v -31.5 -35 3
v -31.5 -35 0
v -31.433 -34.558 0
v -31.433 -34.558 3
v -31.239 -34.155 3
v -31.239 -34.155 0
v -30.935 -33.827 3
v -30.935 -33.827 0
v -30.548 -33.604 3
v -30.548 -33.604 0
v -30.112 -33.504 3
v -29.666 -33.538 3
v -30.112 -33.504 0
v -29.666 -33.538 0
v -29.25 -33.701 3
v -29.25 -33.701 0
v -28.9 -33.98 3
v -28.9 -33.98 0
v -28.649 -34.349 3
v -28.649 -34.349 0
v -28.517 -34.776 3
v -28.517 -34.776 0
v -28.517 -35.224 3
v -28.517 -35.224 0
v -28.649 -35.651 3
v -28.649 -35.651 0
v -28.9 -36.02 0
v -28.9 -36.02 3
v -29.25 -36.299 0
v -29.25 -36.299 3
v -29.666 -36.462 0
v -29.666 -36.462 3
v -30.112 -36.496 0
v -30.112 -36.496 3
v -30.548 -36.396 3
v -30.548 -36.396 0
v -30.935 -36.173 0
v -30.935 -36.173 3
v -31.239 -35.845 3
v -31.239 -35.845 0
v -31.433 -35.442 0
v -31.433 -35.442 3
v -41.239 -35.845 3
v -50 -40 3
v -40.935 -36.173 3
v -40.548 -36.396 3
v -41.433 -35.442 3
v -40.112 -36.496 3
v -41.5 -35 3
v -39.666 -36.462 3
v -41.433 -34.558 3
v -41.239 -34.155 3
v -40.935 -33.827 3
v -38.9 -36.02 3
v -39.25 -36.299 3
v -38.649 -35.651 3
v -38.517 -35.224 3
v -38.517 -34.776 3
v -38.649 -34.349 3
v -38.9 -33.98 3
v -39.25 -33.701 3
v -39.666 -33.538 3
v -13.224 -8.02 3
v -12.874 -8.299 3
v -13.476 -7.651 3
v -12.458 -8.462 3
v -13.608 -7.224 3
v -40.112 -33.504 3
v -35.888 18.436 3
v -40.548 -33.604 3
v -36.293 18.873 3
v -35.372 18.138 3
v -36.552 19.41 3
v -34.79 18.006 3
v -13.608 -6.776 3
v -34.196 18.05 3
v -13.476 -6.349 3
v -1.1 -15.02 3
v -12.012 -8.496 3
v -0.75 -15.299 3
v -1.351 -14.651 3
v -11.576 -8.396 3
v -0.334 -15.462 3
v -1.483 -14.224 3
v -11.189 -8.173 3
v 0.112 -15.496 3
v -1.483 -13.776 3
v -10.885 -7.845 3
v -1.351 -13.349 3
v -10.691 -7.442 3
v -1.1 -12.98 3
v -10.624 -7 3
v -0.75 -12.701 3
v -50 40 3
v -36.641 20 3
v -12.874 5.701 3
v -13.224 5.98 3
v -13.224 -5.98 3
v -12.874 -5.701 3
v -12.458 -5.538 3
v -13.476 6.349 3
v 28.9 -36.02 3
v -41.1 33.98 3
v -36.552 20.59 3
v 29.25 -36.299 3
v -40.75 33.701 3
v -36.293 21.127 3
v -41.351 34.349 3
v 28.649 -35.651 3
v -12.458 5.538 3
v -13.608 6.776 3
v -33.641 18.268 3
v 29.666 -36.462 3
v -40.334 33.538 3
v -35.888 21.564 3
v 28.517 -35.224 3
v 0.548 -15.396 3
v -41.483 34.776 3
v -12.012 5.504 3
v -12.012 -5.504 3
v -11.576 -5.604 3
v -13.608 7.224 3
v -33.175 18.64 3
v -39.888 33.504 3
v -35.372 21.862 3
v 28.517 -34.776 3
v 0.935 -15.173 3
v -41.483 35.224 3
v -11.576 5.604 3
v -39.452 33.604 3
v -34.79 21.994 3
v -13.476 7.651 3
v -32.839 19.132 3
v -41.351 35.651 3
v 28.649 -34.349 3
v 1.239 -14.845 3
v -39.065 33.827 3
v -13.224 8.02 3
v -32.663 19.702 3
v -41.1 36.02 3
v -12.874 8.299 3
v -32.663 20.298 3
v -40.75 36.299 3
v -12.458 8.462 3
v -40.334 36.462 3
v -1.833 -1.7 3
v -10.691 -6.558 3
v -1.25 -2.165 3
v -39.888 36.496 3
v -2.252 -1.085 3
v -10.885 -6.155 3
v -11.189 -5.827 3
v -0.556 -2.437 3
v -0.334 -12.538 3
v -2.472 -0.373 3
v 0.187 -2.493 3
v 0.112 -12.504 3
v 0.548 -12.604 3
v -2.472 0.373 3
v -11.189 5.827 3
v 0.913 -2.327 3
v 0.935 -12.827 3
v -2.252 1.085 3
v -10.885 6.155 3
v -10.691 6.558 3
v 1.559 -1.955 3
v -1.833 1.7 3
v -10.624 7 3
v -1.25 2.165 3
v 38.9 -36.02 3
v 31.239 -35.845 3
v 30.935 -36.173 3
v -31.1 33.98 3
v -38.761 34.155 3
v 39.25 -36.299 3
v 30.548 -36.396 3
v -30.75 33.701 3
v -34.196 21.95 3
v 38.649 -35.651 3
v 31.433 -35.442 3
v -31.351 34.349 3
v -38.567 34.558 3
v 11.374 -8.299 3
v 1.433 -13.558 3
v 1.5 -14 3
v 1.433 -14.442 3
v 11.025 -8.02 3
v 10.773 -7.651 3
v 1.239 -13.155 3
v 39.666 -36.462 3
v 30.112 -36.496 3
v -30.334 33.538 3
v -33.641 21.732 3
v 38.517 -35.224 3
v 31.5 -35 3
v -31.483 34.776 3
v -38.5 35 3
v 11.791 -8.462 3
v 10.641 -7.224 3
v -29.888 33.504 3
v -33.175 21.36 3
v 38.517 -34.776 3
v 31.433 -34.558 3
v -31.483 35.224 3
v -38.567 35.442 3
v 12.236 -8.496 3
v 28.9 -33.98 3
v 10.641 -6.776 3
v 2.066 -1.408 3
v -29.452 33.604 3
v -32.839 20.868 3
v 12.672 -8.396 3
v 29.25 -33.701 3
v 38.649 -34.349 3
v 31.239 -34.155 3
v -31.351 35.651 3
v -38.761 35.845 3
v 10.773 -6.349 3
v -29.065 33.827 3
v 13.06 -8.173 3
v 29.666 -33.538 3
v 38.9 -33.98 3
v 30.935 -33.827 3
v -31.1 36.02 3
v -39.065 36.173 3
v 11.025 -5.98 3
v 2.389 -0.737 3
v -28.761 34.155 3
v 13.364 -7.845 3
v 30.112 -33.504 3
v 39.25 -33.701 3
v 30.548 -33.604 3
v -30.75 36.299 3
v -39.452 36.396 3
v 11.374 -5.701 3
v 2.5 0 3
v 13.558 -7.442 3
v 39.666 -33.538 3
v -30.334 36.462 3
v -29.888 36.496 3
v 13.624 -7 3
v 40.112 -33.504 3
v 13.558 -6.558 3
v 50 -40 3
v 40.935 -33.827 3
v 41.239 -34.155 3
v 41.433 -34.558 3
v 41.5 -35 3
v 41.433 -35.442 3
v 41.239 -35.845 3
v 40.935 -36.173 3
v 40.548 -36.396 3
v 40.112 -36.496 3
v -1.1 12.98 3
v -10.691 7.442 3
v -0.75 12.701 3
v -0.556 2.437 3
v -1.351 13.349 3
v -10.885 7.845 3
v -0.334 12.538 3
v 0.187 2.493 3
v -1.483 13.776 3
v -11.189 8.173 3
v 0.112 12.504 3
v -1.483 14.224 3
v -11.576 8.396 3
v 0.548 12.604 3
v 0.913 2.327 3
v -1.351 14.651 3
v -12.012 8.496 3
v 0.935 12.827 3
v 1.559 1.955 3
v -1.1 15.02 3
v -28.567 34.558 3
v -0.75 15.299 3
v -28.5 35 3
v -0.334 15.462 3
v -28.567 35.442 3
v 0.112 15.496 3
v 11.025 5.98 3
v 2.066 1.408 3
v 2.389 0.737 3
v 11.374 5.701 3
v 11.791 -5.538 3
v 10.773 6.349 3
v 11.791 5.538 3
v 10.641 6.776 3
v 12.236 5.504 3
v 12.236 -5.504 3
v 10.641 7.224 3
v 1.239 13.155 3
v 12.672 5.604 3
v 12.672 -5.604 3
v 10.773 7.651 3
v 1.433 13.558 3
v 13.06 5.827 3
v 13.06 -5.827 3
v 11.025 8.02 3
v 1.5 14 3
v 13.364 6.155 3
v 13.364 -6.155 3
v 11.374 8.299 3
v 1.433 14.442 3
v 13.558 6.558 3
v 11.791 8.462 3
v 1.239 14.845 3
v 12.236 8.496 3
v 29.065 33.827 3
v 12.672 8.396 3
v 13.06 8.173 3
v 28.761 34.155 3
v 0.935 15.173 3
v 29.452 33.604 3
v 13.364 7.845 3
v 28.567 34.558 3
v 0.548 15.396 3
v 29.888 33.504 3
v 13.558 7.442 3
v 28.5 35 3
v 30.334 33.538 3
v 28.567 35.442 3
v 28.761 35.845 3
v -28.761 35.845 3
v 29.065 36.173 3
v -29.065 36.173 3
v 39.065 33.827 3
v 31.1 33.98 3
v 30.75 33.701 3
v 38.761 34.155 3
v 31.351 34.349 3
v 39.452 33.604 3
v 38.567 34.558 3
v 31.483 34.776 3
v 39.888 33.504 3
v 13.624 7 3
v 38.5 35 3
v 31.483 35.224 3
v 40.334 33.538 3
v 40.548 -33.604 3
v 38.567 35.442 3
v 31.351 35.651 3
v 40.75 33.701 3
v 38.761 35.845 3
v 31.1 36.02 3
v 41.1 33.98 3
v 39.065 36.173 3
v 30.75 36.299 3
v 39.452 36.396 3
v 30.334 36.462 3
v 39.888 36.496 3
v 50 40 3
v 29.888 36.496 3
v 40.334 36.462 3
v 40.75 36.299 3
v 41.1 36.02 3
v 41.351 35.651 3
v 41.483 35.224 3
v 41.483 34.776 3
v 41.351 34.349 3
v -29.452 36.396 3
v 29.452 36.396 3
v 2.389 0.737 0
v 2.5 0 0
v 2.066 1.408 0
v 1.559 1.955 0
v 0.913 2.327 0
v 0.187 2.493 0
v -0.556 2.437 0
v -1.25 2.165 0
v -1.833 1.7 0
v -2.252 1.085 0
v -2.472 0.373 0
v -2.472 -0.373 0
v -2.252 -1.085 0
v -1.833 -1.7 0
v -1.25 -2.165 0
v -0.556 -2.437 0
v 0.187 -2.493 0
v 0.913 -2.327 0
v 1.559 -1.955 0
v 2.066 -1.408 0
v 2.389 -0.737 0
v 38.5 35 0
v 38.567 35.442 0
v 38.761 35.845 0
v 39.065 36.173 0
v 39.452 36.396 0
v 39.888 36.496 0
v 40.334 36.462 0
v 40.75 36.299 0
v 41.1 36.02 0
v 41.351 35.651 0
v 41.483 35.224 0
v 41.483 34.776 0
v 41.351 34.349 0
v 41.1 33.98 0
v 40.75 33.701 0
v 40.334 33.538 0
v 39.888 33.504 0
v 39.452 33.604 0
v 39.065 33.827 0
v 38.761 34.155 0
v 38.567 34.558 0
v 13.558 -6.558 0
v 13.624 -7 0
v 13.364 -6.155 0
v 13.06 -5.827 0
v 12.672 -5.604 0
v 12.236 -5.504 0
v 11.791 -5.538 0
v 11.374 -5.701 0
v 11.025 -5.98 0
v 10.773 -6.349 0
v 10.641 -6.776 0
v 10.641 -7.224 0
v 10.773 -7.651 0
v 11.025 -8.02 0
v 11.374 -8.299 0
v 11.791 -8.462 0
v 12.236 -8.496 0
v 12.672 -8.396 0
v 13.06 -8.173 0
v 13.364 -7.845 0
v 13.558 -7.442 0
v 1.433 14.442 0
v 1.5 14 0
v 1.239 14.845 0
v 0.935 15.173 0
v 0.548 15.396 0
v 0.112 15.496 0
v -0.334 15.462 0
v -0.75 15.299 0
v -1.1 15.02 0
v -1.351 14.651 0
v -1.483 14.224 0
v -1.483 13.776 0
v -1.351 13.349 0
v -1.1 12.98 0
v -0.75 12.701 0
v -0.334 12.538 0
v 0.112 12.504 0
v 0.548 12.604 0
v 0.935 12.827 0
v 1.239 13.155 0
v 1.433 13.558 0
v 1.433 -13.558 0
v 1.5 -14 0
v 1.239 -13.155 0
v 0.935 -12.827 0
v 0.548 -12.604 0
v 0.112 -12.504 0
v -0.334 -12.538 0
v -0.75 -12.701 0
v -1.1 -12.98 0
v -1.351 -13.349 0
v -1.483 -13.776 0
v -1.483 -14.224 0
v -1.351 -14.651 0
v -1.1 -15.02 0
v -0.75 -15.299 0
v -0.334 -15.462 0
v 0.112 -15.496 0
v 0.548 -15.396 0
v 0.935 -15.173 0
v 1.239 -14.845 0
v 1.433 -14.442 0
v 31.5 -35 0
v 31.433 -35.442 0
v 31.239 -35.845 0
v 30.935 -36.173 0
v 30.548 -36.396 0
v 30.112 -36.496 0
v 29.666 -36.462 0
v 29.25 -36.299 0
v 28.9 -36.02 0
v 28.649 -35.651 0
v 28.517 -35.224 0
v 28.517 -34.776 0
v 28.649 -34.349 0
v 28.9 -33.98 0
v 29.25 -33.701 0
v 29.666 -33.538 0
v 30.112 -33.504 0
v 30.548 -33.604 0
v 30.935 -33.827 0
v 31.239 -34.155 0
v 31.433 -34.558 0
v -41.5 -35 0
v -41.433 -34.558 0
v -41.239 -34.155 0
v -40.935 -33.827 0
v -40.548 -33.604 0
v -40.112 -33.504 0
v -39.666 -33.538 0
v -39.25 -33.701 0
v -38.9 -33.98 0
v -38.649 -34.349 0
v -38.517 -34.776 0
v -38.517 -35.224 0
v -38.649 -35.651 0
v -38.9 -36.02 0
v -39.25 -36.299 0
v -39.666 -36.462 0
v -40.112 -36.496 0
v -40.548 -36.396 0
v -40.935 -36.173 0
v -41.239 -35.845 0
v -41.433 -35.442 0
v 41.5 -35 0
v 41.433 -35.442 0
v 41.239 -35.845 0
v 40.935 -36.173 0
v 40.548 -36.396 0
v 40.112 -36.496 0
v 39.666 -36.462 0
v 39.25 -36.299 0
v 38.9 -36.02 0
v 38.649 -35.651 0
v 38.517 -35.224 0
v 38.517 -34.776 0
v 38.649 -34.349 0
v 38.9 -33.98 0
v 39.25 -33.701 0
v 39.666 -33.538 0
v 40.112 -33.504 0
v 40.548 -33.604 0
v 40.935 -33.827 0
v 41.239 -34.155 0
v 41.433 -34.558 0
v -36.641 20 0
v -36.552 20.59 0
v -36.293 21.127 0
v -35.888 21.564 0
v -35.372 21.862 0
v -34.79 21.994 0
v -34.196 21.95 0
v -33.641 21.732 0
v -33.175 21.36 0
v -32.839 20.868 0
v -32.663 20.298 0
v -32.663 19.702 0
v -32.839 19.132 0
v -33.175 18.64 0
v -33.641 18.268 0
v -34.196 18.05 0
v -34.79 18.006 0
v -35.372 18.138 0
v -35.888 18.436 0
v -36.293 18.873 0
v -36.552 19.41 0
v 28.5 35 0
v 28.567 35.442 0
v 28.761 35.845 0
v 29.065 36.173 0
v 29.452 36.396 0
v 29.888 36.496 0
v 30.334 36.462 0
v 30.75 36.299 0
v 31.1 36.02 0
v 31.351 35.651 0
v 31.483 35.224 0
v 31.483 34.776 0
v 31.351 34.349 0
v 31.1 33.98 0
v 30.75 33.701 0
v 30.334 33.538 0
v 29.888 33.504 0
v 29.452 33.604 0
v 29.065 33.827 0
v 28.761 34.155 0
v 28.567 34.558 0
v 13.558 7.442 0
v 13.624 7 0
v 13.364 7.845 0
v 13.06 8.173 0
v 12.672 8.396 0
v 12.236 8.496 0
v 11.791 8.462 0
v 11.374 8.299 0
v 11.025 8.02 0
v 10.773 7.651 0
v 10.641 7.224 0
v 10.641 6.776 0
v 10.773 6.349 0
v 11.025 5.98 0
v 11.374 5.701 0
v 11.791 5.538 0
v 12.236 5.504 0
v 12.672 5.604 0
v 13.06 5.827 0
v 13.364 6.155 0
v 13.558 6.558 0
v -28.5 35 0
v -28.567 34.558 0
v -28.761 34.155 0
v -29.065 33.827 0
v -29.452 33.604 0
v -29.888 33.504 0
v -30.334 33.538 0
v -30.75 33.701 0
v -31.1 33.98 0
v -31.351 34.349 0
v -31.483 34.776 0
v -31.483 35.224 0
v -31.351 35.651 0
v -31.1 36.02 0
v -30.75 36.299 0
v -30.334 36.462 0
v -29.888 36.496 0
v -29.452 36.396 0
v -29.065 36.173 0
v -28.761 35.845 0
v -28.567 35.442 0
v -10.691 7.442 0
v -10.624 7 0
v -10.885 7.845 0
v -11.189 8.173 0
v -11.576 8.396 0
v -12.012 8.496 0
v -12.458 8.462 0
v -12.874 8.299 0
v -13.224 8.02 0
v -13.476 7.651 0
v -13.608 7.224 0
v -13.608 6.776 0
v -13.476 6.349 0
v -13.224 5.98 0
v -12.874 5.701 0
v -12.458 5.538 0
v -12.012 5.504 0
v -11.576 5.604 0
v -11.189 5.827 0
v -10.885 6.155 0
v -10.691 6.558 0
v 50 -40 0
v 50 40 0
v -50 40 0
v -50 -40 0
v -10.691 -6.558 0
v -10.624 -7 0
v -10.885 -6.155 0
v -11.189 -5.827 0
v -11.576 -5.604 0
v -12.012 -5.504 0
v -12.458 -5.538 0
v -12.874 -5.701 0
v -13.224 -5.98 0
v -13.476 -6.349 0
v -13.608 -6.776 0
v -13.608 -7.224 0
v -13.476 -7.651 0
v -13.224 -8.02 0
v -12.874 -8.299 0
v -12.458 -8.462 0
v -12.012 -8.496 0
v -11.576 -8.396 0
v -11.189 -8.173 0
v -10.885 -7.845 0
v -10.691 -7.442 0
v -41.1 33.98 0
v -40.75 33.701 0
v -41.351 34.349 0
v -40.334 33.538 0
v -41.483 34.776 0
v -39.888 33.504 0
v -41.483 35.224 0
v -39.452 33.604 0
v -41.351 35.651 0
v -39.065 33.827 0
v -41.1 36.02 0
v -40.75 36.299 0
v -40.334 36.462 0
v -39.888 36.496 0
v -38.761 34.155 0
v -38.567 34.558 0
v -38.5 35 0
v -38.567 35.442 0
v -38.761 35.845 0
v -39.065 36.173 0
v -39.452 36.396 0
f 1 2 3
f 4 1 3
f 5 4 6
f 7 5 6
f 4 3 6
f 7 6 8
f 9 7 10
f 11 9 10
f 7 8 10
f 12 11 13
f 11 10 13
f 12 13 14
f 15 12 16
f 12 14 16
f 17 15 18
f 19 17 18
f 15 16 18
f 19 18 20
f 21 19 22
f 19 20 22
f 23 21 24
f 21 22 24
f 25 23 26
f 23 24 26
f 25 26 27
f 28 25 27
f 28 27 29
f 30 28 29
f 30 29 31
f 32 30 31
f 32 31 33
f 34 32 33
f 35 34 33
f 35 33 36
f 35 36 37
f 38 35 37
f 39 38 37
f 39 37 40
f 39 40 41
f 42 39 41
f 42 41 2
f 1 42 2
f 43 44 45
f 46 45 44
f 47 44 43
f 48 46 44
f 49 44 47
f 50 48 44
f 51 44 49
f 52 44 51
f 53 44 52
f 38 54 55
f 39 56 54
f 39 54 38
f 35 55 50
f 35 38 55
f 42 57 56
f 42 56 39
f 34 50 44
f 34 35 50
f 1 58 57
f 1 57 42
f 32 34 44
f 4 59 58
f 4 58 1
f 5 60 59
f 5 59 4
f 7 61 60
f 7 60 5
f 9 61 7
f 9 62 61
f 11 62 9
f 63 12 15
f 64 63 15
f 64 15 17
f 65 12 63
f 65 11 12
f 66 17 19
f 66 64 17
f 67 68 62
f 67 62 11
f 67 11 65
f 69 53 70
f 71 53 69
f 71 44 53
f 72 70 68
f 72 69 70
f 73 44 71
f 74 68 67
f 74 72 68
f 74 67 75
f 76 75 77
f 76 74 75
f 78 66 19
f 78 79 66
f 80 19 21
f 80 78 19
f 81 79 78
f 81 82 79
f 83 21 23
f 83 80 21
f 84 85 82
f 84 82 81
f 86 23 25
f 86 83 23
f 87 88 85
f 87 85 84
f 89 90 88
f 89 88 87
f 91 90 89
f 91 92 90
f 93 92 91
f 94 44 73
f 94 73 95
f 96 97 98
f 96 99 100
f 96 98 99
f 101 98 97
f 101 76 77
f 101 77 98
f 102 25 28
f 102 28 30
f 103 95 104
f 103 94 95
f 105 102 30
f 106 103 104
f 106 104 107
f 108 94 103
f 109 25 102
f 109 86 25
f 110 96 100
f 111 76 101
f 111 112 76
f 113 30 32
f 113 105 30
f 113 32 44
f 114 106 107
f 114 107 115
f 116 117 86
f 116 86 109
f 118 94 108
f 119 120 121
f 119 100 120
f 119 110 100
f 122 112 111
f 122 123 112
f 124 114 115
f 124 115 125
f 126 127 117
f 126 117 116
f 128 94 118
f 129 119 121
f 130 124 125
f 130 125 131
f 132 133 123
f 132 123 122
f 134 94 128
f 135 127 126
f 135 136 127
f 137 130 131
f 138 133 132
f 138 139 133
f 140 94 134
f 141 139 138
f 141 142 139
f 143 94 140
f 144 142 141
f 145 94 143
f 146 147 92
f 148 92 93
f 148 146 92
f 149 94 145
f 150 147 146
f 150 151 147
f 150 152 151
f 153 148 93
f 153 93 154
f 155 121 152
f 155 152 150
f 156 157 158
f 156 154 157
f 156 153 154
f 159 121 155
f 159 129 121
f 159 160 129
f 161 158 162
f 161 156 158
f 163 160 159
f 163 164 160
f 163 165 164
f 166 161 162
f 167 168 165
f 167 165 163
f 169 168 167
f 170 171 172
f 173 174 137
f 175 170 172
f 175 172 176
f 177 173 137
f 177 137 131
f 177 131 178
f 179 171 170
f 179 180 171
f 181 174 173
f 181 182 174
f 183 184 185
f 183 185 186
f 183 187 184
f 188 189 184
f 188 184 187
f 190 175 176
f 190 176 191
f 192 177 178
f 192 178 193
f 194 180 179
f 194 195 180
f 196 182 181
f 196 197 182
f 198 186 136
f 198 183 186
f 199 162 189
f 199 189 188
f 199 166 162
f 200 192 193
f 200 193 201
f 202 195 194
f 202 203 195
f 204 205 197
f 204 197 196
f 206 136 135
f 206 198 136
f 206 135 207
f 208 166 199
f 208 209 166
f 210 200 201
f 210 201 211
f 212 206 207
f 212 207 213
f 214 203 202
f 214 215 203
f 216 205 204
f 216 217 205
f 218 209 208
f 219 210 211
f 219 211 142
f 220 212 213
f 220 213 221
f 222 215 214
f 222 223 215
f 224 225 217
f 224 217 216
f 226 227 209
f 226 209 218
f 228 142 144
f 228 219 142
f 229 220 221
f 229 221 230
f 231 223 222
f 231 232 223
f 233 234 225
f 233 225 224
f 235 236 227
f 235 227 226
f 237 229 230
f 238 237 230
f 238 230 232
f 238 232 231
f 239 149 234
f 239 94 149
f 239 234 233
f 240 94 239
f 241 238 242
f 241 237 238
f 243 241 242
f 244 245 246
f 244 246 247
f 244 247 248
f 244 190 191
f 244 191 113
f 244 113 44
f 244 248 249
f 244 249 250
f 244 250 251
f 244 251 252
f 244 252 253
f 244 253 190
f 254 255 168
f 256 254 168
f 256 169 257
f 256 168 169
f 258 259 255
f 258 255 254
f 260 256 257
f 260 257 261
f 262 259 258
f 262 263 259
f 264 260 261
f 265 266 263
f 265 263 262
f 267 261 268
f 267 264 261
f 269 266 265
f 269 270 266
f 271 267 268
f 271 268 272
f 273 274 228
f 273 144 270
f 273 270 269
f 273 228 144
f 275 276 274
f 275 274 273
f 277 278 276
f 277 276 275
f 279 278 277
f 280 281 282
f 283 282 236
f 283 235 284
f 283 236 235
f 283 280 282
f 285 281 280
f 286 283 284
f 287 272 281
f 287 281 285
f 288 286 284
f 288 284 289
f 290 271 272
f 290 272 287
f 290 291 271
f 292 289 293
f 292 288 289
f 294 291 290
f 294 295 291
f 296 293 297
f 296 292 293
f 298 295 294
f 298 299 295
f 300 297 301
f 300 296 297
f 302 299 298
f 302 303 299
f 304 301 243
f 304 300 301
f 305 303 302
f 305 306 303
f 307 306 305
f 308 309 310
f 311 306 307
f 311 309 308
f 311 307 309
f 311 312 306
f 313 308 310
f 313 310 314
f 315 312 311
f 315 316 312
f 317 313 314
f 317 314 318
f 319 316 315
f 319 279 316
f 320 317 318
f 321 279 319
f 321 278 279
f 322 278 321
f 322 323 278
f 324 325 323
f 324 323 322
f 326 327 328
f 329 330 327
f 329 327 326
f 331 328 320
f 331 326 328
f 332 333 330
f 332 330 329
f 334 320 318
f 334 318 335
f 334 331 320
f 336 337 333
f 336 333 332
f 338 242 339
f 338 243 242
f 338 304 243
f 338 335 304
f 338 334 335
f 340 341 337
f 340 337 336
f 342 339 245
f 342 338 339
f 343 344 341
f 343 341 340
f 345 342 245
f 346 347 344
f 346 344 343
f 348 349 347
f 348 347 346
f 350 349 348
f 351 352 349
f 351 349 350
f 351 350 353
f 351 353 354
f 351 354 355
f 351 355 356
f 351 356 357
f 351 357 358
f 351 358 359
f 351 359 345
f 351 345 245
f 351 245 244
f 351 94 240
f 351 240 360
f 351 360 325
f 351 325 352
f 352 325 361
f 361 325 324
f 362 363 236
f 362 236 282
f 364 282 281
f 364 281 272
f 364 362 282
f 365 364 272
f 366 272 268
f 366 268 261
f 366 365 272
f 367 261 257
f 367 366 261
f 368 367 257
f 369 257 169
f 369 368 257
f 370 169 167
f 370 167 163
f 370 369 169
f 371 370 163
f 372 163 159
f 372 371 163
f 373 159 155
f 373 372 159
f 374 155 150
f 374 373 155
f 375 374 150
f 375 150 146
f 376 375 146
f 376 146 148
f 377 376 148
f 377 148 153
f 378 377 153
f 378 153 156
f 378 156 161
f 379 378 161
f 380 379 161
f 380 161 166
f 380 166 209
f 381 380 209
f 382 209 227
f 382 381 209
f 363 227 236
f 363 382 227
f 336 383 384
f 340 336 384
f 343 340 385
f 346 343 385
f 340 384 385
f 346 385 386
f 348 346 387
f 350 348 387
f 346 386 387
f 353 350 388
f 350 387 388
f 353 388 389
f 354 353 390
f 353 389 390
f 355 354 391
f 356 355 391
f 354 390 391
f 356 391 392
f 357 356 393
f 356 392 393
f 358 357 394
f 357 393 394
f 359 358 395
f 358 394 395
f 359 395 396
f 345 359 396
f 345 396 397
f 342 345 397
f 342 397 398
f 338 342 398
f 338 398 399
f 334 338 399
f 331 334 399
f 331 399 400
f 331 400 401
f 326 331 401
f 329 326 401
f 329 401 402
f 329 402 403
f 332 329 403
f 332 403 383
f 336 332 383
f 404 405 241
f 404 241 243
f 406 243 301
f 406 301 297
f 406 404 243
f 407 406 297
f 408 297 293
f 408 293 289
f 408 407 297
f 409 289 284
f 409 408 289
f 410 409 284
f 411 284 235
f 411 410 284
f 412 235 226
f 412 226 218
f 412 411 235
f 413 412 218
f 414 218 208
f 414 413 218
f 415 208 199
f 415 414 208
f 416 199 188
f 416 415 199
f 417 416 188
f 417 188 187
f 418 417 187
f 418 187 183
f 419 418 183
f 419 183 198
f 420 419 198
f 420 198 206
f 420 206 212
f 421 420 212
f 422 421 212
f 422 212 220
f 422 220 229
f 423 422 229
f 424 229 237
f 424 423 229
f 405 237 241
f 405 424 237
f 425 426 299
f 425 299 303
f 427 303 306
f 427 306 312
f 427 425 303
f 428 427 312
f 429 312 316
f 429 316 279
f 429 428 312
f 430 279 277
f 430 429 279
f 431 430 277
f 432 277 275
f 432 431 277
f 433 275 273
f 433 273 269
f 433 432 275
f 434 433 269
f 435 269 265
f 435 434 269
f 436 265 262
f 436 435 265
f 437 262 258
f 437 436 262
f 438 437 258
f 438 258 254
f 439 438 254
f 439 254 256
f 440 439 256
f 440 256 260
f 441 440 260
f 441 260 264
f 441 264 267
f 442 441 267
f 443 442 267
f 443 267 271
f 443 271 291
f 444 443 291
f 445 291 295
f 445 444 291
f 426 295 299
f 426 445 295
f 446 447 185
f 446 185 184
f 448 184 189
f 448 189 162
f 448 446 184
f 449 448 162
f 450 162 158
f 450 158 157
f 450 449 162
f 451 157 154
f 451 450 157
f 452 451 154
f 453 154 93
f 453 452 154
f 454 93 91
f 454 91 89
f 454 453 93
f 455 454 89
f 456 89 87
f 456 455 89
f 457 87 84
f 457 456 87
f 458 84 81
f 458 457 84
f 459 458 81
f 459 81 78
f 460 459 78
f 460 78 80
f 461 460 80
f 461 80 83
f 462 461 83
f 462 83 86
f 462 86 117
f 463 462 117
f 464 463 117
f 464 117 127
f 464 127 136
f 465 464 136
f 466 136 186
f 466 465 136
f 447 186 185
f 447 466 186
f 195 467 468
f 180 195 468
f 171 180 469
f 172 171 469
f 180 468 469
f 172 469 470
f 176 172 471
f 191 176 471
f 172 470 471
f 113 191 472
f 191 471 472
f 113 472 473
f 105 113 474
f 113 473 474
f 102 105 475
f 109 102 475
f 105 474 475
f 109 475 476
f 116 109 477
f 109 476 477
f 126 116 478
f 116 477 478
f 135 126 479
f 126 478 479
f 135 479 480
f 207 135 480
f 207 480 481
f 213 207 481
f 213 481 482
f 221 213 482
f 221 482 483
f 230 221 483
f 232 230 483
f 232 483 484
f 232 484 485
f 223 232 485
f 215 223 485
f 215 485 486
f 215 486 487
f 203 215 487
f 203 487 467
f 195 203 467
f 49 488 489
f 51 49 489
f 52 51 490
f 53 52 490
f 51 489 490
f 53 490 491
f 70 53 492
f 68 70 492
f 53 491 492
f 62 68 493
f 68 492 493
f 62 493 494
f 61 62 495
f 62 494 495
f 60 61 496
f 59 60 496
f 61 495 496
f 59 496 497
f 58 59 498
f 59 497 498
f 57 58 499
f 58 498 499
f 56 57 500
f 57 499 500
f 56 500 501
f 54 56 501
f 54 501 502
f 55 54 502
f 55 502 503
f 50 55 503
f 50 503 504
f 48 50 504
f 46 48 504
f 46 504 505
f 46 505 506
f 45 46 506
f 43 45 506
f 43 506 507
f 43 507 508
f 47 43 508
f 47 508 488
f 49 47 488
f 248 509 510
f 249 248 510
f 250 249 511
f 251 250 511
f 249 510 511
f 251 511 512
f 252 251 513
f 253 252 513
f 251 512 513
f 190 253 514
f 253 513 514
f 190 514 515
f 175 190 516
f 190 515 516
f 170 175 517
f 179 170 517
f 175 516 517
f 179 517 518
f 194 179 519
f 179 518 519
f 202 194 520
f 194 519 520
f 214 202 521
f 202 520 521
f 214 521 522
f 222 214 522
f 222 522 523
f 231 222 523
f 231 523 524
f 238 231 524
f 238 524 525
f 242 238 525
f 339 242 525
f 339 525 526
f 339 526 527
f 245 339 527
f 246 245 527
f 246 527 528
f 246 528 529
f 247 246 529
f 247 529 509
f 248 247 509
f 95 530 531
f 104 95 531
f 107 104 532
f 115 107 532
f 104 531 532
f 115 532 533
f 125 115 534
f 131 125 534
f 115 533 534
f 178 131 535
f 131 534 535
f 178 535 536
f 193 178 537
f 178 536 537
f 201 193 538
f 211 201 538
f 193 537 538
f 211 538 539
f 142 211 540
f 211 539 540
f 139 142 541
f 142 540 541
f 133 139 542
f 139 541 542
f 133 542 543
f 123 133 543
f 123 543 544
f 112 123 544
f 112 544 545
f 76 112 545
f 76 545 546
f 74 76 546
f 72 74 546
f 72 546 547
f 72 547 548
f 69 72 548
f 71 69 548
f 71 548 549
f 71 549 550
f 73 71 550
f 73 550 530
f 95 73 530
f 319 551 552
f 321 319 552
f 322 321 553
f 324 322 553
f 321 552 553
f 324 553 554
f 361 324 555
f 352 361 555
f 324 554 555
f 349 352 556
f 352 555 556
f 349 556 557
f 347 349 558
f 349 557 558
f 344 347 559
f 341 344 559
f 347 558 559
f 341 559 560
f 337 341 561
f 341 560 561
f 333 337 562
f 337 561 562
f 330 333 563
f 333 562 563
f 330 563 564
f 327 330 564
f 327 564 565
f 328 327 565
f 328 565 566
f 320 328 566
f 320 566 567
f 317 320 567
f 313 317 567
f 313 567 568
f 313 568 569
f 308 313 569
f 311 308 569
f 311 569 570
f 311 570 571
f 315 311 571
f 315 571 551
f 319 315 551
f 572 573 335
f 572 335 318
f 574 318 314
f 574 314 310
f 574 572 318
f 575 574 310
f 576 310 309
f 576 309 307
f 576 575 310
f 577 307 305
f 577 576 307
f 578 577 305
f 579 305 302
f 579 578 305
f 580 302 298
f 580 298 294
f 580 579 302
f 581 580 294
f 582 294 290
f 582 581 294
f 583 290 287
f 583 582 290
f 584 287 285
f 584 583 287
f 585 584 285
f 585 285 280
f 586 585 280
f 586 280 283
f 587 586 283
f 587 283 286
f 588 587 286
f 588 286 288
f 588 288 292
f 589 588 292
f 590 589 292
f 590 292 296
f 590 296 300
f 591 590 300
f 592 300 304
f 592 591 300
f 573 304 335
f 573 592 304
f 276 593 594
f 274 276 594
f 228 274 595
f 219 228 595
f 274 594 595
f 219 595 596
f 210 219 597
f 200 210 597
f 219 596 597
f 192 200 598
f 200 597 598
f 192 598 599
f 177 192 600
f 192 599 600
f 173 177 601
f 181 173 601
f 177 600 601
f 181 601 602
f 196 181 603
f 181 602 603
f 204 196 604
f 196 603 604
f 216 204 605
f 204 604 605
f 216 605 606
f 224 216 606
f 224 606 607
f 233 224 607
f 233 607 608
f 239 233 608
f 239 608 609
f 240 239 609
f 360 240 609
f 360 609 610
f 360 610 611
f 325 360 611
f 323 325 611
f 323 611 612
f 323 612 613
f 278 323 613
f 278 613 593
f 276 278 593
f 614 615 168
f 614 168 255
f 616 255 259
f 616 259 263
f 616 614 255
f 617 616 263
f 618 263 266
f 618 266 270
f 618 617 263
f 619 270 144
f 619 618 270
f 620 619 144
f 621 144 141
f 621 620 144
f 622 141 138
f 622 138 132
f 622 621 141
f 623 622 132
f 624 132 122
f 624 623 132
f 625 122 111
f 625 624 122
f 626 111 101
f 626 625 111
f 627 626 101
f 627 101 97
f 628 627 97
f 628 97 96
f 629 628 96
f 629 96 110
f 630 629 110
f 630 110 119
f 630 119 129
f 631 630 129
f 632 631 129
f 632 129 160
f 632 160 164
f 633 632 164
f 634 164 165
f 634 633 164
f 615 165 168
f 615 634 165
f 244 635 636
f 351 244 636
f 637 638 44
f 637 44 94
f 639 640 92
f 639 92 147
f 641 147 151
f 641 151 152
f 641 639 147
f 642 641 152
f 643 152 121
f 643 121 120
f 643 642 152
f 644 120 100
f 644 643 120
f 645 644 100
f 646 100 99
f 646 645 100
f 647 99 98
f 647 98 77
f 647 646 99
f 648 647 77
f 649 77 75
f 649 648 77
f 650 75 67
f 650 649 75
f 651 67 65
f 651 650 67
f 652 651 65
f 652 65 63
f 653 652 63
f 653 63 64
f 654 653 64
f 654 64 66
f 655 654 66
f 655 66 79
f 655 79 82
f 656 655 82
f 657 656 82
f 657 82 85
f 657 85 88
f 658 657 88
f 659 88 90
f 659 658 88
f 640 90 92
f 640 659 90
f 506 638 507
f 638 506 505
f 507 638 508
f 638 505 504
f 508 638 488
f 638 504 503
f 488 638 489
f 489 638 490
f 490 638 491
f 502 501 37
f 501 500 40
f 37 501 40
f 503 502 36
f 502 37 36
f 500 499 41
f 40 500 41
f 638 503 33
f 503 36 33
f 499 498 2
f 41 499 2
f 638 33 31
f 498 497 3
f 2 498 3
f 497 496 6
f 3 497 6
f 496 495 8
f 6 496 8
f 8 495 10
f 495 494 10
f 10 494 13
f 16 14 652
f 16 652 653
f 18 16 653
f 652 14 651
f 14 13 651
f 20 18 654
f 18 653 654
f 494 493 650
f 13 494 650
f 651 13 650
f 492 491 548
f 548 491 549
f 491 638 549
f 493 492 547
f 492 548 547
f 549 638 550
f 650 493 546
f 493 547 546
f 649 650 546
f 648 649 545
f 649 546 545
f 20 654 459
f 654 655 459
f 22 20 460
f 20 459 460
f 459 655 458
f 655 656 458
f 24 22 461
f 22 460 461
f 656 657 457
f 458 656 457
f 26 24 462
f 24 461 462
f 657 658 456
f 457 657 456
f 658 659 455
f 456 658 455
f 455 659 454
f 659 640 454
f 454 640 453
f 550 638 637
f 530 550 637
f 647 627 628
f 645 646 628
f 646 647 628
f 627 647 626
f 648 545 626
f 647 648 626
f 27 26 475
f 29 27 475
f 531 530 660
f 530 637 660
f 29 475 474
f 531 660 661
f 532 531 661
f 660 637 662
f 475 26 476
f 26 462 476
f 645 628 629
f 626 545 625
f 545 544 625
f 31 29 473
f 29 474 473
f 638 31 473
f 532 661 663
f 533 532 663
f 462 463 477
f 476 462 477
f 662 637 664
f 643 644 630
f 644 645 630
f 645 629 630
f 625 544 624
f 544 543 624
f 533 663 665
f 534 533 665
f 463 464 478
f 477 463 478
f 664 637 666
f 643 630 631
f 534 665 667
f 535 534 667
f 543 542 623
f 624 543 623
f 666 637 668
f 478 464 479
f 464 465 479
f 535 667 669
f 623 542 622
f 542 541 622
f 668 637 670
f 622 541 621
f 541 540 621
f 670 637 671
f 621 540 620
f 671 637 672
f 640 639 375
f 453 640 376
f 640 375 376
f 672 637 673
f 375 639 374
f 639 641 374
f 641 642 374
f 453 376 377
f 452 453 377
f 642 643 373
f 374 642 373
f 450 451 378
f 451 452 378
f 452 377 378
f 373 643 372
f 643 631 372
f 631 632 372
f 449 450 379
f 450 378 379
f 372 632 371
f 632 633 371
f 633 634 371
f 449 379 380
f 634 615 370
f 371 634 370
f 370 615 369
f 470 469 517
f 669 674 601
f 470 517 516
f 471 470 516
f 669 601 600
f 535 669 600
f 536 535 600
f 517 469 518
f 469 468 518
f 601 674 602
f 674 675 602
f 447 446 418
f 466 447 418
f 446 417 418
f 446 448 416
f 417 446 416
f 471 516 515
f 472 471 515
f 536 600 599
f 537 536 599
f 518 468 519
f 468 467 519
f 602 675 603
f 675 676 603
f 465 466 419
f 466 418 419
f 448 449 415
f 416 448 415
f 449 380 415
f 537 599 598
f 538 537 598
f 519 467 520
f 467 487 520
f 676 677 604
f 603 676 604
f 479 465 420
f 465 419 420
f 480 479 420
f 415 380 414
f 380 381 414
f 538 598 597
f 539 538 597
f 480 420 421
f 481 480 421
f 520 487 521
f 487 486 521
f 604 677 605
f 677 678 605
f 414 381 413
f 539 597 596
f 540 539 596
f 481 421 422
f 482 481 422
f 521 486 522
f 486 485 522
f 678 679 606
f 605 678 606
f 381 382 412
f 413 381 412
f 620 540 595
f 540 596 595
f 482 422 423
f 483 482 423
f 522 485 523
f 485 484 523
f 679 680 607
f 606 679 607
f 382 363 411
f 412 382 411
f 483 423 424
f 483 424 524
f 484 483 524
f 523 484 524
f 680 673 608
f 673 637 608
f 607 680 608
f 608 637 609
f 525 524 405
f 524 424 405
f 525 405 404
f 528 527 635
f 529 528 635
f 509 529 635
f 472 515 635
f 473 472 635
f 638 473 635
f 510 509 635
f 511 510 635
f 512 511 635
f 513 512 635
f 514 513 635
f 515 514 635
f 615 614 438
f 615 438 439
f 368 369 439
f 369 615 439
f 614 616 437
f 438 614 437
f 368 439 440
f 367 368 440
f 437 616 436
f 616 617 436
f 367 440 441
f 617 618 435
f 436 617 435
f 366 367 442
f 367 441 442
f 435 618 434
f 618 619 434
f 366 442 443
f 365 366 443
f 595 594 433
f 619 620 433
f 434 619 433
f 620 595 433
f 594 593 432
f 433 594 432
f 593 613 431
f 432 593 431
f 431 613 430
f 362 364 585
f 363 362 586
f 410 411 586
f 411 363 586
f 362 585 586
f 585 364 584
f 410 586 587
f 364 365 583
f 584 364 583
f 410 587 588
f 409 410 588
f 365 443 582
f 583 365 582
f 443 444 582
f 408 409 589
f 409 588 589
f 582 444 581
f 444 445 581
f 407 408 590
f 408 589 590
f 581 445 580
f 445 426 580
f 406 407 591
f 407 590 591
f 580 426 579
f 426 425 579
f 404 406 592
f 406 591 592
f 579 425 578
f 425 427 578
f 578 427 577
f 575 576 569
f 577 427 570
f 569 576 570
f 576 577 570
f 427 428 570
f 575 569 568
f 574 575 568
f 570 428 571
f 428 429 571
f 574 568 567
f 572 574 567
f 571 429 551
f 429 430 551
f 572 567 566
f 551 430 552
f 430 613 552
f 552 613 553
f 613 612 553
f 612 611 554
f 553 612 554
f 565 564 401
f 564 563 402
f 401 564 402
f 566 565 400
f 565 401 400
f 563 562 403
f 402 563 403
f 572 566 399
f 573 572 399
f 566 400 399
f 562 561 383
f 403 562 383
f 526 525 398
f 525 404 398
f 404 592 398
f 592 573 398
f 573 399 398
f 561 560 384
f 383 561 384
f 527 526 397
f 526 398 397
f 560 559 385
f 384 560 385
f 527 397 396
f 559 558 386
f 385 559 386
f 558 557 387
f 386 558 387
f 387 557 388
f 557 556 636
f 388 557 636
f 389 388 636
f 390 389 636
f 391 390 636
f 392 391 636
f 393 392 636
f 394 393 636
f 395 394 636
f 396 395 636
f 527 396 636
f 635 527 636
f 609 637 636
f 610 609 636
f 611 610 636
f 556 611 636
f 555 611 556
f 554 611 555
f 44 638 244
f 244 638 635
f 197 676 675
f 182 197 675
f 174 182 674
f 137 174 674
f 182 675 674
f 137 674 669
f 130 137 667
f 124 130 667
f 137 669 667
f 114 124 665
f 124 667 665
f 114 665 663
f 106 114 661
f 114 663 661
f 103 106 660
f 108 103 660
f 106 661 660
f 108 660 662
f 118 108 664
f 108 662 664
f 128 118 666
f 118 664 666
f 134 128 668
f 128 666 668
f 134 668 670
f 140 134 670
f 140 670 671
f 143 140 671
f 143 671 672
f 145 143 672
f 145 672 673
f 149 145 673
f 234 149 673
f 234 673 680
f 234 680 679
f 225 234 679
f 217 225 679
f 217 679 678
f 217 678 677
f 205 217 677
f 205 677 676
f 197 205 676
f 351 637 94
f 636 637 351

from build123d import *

# Parameters (mm, degrees)
SKETCH_1_W          = 100
SKETCH_1_H          = 80
SKETCH_1_R          = 1.5
SKETCH_1_R_2        = 2.5
EXTRUDE_1_DEPTH     = 3
SKETCH_2_R          = 1.5
CUT_EXTRUDE_1_DEPTH = 10
SKETCH_3_R          = 2
CUT_EXTRUDE_2_DEPTH = 65.101482042


with BuildPart() as part:
    # 草图1 → 凸台-拉伸1 (new body)
    with BuildSketch(Plane.XY):
        Rectangle(SKETCH_1_W, SKETCH_1_H)
        with Locations((0, 14)):
            Circle(SKETCH_1_R, mode=Mode.SUBTRACT)
        with Locations((12.124355653, 7)):
            Circle(SKETCH_1_R, mode=Mode.SUBTRACT)
        with Locations((12.124355653, -7)):
            Circle(SKETCH_1_R, mode=Mode.SUBTRACT)
        with Locations((0, -14)):
            Circle(SKETCH_1_R, mode=Mode.SUBTRACT)
        with Locations((-12.124355653, -7)):
            Circle(SKETCH_1_R, mode=Mode.SUBTRACT)
        with Locations((-12.124355653, 7)):
            Circle(SKETCH_1_R, mode=Mode.SUBTRACT)
        Circle(SKETCH_1_R_2, mode=Mode.SUBTRACT)
    extrude(amount=EXTRUDE_1_DEPTH)

    # 草图2 → 切除-拉伸1 (cut)
    with BuildSketch(Plane(origin=(0, 0, 0), x_dir=(-1, 0, 0), z_dir=(0, 0, -1))):
        with Locations((-40, 35)):
            Circle(SKETCH_2_R)
        with Locations((-30, 35)):
            Circle(SKETCH_2_R)
        with Locations(Location((30, 35, 0), (0, 0, 180))):
            Circle(SKETCH_2_R)
        with Locations(Location((40, 35, 0), (0, 0, 180))):
            Circle(SKETCH_2_R)
        with Locations((40, -35)):
            Circle(SKETCH_2_R)
        with Locations((30, -35)):
            Circle(SKETCH_2_R)
        with Locations(Location((-30, -35, 0), (0, 0, 180))):
            Circle(SKETCH_2_R)
        with Locations(Location((-40, -35, 0), (0, 0, 180))):
            Circle(SKETCH_2_R)
    extrude(amount=-CUT_EXTRUDE_1_DEPTH, mode=Mode.SUBTRACT)

    # 草图3 → 切除-拉伸2 (cut, through all)
    with BuildSketch(Plane(origin=(0, 0, 0), x_dir=(-1, 0, 0), z_dir=(0, 0, -1))):
        with Locations((34.641016151, 20)):
            Circle(SKETCH_3_R)
    extrude(amount=-CUT_EXTRUDE_2_DEPTH, mode=Mode.SUBTRACT)


solid = part.part
